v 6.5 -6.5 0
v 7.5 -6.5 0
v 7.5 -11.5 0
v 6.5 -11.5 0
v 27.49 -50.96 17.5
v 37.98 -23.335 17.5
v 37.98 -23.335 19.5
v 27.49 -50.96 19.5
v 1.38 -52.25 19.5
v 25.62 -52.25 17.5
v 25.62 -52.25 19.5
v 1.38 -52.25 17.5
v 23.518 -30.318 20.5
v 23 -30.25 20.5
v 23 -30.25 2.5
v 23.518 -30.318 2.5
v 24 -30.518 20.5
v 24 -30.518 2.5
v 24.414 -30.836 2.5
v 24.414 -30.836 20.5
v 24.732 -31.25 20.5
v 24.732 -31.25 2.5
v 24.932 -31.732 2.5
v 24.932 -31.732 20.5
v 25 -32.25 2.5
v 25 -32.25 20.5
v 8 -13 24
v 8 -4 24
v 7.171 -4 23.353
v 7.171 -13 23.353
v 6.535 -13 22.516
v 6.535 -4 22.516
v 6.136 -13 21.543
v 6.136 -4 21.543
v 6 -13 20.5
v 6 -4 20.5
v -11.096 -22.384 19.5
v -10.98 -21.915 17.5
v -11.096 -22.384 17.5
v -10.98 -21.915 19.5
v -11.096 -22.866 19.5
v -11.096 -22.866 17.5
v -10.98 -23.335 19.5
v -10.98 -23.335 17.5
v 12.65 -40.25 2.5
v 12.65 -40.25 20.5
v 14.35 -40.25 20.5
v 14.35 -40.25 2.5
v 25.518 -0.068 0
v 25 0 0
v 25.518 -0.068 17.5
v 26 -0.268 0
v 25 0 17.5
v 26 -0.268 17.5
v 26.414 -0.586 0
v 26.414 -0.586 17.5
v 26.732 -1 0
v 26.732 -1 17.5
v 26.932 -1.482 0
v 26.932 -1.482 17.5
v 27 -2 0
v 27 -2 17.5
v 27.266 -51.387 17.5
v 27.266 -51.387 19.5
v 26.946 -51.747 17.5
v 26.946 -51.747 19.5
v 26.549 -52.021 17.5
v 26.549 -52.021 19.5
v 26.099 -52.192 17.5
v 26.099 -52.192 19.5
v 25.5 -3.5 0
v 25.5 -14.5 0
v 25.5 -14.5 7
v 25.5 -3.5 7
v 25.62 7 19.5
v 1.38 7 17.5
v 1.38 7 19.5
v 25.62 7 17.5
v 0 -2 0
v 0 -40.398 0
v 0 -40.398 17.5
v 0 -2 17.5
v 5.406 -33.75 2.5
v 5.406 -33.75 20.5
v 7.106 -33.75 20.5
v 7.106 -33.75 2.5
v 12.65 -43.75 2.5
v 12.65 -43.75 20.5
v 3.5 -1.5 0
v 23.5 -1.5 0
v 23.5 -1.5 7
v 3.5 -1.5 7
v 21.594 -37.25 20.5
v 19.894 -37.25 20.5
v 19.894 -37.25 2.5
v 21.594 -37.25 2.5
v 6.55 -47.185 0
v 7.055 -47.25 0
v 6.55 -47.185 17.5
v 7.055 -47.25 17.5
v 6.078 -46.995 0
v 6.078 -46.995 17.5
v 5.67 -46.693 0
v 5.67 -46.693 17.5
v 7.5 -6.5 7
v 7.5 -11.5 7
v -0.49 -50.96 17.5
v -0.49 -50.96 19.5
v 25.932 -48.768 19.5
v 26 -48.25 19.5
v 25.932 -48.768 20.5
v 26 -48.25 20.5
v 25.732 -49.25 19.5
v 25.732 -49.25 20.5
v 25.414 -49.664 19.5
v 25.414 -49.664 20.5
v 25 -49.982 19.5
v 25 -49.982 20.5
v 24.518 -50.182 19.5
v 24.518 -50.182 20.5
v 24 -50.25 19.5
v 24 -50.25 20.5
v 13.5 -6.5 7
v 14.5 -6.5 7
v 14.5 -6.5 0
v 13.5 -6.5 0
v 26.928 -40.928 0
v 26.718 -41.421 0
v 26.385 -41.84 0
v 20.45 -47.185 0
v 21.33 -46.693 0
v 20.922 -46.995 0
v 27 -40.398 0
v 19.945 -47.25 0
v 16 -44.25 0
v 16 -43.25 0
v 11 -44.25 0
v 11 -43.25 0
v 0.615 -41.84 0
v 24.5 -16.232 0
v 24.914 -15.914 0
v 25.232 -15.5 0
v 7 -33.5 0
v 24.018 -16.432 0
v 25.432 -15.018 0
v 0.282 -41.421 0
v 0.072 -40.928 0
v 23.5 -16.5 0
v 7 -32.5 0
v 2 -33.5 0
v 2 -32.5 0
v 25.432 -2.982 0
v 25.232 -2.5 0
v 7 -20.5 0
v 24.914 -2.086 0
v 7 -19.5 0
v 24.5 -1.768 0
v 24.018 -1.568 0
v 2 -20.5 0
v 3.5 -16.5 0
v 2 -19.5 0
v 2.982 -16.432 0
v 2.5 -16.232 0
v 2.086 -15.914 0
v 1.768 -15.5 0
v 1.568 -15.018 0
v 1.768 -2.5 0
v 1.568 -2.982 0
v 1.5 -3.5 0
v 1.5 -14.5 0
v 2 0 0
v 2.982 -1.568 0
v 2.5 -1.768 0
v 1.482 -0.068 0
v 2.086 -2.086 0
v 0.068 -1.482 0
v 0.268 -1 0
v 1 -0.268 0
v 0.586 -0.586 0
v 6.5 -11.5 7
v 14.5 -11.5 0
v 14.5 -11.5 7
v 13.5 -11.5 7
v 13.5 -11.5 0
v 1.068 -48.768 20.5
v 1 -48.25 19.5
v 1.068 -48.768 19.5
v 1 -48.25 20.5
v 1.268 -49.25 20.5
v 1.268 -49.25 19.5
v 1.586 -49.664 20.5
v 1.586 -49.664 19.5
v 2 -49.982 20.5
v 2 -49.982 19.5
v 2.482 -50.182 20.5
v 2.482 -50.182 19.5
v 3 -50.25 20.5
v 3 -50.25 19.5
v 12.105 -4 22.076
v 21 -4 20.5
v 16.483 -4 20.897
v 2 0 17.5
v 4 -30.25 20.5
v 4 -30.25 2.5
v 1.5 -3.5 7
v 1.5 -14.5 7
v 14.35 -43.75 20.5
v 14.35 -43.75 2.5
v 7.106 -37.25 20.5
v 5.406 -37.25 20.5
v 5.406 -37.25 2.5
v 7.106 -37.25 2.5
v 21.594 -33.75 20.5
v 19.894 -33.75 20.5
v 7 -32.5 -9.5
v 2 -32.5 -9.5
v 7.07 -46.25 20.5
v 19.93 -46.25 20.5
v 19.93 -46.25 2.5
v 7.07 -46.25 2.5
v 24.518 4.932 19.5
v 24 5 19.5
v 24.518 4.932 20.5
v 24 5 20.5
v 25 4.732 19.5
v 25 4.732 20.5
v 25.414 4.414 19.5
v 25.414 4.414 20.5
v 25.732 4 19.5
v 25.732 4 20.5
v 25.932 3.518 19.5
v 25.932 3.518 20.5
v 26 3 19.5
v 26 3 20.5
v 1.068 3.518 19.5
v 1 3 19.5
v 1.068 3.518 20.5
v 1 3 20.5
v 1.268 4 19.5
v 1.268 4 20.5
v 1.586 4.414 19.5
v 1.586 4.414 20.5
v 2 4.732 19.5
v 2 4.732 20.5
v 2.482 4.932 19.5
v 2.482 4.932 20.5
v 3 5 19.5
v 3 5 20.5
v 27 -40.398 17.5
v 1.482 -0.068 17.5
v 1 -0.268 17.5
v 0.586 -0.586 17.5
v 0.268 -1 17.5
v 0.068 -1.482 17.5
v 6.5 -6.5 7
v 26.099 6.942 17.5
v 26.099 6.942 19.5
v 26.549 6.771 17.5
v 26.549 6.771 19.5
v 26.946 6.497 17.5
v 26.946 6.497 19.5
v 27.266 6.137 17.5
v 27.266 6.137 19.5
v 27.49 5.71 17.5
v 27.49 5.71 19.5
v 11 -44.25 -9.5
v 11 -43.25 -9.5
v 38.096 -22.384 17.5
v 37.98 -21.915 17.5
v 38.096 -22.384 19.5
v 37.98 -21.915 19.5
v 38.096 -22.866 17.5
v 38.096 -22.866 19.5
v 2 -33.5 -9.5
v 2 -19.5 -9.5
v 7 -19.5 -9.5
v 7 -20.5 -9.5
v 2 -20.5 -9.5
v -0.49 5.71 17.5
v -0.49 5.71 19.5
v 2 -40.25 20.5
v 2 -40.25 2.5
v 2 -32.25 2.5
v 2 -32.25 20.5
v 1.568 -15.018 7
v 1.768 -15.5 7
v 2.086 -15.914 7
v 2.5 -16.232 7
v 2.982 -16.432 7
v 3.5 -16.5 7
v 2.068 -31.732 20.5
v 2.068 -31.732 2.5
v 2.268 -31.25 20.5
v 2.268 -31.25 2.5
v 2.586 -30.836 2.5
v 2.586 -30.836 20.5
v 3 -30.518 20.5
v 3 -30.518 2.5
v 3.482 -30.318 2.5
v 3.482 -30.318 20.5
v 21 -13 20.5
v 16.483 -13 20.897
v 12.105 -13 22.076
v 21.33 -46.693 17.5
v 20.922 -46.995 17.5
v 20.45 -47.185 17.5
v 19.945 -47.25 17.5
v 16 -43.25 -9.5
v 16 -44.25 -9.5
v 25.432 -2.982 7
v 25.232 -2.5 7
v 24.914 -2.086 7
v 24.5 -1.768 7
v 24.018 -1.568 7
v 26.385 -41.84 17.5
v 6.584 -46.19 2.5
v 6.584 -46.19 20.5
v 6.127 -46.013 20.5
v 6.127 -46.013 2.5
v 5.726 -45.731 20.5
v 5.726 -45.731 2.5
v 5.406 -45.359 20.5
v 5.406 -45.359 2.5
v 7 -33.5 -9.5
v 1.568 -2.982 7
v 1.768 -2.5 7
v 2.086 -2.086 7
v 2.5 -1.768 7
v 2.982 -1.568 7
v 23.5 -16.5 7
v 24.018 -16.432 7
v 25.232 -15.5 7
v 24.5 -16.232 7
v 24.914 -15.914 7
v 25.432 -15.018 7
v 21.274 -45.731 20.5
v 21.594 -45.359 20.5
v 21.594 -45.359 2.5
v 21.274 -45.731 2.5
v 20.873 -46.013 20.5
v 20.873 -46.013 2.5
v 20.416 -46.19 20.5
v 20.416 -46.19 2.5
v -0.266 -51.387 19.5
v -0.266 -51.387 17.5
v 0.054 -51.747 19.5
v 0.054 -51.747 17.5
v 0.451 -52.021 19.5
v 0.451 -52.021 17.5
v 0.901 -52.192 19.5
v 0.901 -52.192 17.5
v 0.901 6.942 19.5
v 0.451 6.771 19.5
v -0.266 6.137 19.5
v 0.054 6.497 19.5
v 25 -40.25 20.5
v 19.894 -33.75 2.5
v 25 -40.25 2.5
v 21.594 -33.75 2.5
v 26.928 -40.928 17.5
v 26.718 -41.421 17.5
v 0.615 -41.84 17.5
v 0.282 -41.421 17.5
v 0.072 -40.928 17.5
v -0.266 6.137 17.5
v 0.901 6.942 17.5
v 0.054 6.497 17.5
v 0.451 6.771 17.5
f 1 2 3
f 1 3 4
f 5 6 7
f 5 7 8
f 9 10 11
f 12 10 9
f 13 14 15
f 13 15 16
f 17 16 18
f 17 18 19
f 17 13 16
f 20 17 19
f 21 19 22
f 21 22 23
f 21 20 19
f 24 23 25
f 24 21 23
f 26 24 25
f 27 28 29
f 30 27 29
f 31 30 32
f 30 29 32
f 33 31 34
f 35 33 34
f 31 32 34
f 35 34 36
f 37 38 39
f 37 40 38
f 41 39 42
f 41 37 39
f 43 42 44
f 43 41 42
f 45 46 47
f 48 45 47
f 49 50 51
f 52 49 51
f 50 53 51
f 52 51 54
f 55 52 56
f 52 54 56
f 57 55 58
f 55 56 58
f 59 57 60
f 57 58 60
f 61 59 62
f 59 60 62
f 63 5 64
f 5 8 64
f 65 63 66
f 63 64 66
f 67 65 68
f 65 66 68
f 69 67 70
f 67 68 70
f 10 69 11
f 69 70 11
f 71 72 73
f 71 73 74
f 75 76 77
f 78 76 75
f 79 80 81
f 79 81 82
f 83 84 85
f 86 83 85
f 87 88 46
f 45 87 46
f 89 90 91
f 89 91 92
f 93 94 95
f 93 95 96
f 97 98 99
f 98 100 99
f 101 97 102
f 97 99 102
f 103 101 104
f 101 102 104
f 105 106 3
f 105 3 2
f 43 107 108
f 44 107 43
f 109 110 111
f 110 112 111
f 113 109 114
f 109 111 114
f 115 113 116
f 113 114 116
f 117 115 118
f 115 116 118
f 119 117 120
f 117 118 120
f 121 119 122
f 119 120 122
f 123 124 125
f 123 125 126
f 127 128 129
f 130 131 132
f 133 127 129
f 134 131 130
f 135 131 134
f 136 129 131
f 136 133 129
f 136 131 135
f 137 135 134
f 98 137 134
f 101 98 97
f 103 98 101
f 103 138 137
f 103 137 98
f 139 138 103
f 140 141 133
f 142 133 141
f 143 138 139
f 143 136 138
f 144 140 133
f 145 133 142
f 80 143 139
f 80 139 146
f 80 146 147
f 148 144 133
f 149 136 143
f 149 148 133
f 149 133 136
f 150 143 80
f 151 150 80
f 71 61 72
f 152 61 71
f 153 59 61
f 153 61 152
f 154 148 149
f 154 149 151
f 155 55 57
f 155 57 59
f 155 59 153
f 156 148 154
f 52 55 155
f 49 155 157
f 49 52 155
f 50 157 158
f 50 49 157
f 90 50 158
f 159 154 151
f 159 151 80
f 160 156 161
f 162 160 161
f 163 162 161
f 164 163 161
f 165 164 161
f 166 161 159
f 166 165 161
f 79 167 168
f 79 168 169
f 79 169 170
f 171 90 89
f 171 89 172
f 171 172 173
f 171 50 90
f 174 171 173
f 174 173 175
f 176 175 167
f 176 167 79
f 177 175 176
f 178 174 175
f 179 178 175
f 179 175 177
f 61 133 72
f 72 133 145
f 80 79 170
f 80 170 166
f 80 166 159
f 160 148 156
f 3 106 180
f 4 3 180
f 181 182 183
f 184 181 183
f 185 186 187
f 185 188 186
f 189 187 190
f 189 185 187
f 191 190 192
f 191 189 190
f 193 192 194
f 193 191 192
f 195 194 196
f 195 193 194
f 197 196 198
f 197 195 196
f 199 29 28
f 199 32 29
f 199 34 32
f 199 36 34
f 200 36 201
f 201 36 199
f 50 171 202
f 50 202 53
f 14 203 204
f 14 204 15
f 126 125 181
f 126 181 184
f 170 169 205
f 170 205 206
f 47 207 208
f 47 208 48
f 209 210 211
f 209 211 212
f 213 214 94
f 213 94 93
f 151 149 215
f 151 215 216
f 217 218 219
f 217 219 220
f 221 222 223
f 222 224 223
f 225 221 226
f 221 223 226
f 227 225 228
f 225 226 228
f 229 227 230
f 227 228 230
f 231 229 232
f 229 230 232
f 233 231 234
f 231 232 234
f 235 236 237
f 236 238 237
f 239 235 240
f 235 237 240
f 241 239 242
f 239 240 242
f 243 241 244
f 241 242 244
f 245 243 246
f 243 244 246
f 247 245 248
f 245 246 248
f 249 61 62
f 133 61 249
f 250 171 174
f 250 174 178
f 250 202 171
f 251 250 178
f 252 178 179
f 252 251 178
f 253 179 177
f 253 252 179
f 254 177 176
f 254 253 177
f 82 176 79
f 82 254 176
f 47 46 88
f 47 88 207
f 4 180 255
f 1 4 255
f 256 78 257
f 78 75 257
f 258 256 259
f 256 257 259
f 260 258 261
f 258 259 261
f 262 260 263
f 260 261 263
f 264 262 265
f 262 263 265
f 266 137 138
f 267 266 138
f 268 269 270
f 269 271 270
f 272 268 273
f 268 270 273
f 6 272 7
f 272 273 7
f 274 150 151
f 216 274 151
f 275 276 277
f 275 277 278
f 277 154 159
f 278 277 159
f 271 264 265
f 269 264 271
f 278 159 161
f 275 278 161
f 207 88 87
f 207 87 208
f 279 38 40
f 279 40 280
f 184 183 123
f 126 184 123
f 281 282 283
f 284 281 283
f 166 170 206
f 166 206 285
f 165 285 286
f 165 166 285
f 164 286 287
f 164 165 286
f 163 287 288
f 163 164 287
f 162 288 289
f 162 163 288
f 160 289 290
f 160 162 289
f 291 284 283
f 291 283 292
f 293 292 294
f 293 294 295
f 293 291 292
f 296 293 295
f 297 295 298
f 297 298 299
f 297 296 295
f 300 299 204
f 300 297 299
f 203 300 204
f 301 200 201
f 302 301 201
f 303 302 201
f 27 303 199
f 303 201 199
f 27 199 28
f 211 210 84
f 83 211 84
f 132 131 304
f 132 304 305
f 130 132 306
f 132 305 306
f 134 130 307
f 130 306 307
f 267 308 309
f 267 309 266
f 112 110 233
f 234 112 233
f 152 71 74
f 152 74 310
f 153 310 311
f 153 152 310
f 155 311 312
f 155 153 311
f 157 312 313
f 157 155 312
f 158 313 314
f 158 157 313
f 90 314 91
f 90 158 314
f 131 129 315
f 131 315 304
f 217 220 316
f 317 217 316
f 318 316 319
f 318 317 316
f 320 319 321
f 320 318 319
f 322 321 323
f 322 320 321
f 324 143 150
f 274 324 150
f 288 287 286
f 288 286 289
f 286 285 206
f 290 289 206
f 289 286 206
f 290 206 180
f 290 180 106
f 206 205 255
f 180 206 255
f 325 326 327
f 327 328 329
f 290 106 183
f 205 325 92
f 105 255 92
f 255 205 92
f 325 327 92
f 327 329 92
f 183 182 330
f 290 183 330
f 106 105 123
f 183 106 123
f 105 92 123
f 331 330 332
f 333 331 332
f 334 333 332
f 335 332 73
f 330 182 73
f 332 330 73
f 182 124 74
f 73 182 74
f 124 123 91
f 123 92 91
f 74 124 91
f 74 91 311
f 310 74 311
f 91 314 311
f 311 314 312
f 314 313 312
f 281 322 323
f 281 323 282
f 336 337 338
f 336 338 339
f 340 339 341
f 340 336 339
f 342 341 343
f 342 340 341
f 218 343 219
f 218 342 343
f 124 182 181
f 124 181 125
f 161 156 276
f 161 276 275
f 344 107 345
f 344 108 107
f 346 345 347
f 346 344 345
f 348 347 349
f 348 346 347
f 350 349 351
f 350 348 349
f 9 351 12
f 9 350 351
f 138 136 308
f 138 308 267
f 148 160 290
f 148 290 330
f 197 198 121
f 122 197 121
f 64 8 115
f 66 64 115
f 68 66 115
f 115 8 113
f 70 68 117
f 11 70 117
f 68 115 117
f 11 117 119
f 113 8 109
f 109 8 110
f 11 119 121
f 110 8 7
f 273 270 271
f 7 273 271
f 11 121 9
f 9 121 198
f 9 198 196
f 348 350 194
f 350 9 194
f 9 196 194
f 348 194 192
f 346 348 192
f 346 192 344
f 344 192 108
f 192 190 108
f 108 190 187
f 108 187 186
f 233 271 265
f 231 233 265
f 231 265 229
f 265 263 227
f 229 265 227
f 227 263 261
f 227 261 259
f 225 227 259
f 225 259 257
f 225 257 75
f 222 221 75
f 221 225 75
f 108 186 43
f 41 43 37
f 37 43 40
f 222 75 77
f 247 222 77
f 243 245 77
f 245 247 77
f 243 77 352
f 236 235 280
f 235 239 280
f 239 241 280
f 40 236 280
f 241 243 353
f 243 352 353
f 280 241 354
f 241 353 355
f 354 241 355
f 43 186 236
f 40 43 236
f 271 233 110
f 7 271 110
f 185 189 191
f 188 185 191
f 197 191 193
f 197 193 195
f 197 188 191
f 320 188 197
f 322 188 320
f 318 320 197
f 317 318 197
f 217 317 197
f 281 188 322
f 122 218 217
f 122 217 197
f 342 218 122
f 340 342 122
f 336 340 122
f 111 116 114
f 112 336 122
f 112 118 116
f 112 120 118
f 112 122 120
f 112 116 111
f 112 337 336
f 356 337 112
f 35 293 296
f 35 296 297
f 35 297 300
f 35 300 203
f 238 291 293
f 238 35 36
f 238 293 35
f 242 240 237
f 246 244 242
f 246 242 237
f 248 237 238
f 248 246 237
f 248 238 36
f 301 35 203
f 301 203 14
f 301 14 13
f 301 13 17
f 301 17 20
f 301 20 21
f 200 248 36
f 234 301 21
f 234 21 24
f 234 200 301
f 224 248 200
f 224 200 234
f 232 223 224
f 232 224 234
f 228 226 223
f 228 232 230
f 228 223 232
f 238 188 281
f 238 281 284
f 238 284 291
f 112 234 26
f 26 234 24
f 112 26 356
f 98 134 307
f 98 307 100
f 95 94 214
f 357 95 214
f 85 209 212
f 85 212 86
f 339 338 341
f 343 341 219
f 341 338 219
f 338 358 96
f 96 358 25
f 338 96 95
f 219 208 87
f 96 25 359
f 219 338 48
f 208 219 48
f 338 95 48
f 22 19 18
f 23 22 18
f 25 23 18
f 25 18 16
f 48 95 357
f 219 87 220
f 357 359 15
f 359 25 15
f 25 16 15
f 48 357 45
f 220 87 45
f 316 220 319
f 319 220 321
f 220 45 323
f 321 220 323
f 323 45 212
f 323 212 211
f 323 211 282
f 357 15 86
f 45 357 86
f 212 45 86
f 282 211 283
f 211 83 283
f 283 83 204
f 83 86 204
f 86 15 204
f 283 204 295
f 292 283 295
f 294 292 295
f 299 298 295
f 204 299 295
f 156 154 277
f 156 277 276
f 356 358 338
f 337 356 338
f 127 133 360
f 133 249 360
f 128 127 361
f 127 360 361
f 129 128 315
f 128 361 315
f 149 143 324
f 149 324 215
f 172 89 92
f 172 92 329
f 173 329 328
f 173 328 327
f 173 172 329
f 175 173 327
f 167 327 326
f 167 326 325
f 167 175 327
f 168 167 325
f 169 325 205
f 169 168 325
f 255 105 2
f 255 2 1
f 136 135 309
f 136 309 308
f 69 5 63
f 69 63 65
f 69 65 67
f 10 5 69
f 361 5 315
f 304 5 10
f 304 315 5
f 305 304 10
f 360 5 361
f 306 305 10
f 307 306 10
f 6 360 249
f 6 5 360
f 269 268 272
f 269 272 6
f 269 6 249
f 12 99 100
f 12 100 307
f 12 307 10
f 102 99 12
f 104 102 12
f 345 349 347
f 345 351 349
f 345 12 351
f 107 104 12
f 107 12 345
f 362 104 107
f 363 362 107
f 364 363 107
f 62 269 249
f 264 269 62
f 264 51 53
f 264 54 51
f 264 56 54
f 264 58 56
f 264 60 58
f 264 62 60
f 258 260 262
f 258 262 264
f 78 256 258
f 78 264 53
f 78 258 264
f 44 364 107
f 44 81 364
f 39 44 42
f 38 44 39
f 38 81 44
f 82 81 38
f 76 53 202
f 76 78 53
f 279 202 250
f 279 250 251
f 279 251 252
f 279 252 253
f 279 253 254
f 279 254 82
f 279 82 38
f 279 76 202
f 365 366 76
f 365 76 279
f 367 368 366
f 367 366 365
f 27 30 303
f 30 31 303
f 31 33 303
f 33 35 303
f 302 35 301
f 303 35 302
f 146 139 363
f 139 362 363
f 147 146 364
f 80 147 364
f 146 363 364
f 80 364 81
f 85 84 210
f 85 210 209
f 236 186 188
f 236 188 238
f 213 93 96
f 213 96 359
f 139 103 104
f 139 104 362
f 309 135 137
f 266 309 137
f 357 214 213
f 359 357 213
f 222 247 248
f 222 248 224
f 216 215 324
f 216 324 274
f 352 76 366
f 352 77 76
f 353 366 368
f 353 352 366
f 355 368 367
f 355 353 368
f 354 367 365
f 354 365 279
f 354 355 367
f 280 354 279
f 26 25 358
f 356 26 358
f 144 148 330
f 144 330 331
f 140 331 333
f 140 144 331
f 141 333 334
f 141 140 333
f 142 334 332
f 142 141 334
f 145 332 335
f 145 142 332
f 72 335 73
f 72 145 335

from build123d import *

# Parameters (mm, degrees)
EXTRUDE_1_DEPTH     = 17.5
EXTRUDE_2_DEPTH     = 2
SKETCH_3_W          = 25
SKETCH_3_H          = 55.25
EXTRUDE_3_DEPTH     = 1
FILLET_1_R          = 2
FILLET_2_R          = 2
FILLET_3_R          = 2
SKETCH_4_W          = 15
SKETCH_4_H          = 9
EXTRUDE_4_DEPTH     = 3.5
CUT_EXTRUDE_1_DEPTH = 9
SKETCH_6_W          = 1.7
SKETCH_6_H          = 3.5
CUT_EXTRUDE_2_DEPTH = 18
FILLET_4_R          = 2
CUT_EXTRUDE_3_DEPTH = 7
SKETCH_8_W          = 5
SKETCH_8_H          = 1
EXTRUDE_5_DEPTH     = 9.5
SKETCH_9_W          = 1
SKETCH_9_H          = 5
EXTRUDE_6_DEPTH     = 7


with BuildPart() as part:
    # Эскиз1 → Бобышка-Вытянуть1 (new body)
    with BuildSketch(Plane.XY):
        Polygon((0, 0), (27, 0), (27, -41.25), (20.75, -47.25), (6.25, -47.25), (0, -41.25), align=None)
    extrude(amount=EXTRUDE_1_DEPTH)

    # Эскиз2 → Бобышка-Вытянуть2 (add)
    with BuildSketch(Plane.XY.offset(17.5)):
        Polygon((0, 7), (27, 7), (38.25, -22.625), (27, -52.25), (0, -52.25), (-11.25, -22.625), align=None)
    extrude(amount=EXTRUDE_2_DEPTH)

    # Эскиз3 → Бобышка-Вытянуть3 (add)
    with BuildSketch(Plane.XY.offset(19.5)):
        with Locations((13.5, -22.625)):
            Rectangle(SKETCH_3_W, SKETCH_3_H)
    extrude(amount=EXTRUDE_3_DEPTH)

    # Скругление1
    fillet_1_edges = [part.edges().sort_by_distance(p)[0] for p in [
        (0, 7, 18.5),
        (27, -52.25, 18.5),
        (38.25, -22.625, 18.5),
        (27, 7, 18.5),
    ]]
    fillet(fillet_1_edges, radius=FILLET_1_R)

    # Скругление2
    fillet_2_edges = [part.edges().sort_by_distance(p)[0] for p in [
        (-11.25, -22.625, 18.5),
        (0, -52.25, 18.5),
    ]]
    fillet(fillet_2_edges, radius=FILLET_2_R)

    # Скругление3
    fillet_3_edges = [part.edges().sort_by_distance(p)[0] for p in [
        (1, 5, 20),
        (1, -50.25, 20),
        (26, -50.25, 20),
        (26, 5, 20),
    ]]
    fillet(fillet_3_edges, radius=FILLET_3_R)

    # Эскиз4 → Бобышка-Вытянуть4 (add)
    with BuildSketch(Plane.XY.offset(20.5)):
        with Locations((13.5, -8.5)):
            Rectangle(SKETCH_4_W, SKETCH_4_H)
    extrude(amount=EXTRUDE_4_DEPTH)

    # Эскиз5 → Вырез-Вытянуть1 (cut)
    with BuildSketch(Plane(origin=(0, -4, 0), x_dir=(1, 0, 0), z_dir=(0, 1, 0))):
        with BuildLine():
            ThreePointArc((21, -20.5), (14.268543991, -21.390306253), (8, -24))
            Line((8, -24), (21, -24))
            Line((21, -24), (21, -20.5))
        make_face()
        with BuildLine():
            Line((6, -20.5), (6, -24))
            Line((6, -24), (8, -24))
            ThreePointArc((8, -24), (6.535262235, -22.515564437), (6, -20.5))
        make_face()
    extrude(amount=-CUT_EXTRUDE_1_DEPTH, mode=Mode.SUBTRACT)

    # Эскиз6 → Вырез-Вытянуть2 (cut)
    with BuildSketch(Plane.XY.offset(20.5)):
        with BuildLine():
            Line((4, -30.25), (23, -30.25))
            ThreePointArc((23, -30.25), (24.414213562, -30.835786438), (25, -32.25))
            Line((25, -32.25), (25, -40.25))
            Line((25, -40.25), (21.593733072, -45.359400392))
            ThreePointArc((21.593733072, -45.359400392), (20.873348334, -46.013349198), (19.929632483, -46.25))
            Line((19.929632483, -46.25), (7.070367517, -46.25))
            ThreePointArc((7.070367517, -46.25), (6.126651666, -46.013349198), (5.406266928, -45.359400392))
            Line((5.406266928, -45.359400392), (2, -40.25))
            Line((2, -40.25), (2, -32.25))
            ThreePointArc((2, -32.25), (2.585786438, -30.835786438), (4, -30.25))
        make_face()
        with Locations((6.256266928, -35.5)):
            Rectangle(SKETCH_6_W, SKETCH_6_H, mode=Mode.SUBTRACT)
        with Locations((20.743733072, -35.5)):
            Rectangle(SKETCH_6_W, SKETCH_6_H, mode=Mode.SUBTRACT)
        with Locations((13.5, -42)):
            Rectangle(SKETCH_6_W, SKETCH_6_H, mode=Mode.SUBTRACT)
    extrude(amount=-CUT_EXTRUDE_2_DEPTH, mode=Mode.SUBTRACT)

    # Скругление4
    fillet_4_edges = [part.edges().sort_by_distance(p)[0] for p in [
        (0, 0, 8.75),
        (27, 0, 8.75),
        (27, -41.25, 8.75),
        (20.75, -47.25, 8.75),
        (6.25, -47.25, 8.75),
        (0, -41.25, 8.75),
    ]]
    fillet(fillet_4_edges, radius=FILLET_4_R)

    # Эскиз7 → Вырез-Вытянуть3 (cut)
    with BuildSketch(Plane(origin=(0, 0, 0), x_dir=(-1, 0, 0), z_dir=(0, 0, -1))):
        with BuildLine():
            Line((-23.5, -1.5), (-3.5, -1.5))
            ThreePointArc((-3.5, -1.5), (-2.085786438, -2.085786438), (-1.5, -3.5))
            Line((-1.5, -3.5), (-1.5, -14.5))
            ThreePointArc((-1.5, -14.5), (-2.085786438, -15.914213562), (-3.5, -16.5))
            Line((-3.5, -16.5), (-23.5, -16.5))
            ThreePointArc((-23.5, -16.5), (-24.914213562, -15.914213562), (-25.5, -14.5))
            Line((-25.5, -14.5), (-25.5, -3.5))
            ThreePointArc((-25.5, -3.5), (-24.914213562, -2.085786438), (-23.5, -1.5))
        make_face()
    extrude(amount=-CUT_EXTRUDE_3_DEPTH, mode=Mode.SUBTRACT)

    # Эскиз8 → Бобышка-Вытянуть5 (add)
    with BuildSketch(Plane(origin=(0, 0, 0), x_dir=(-1, 0, 0), z_dir=(0, 0, -1))):
        with Locations((-4.5, -20)):
            Rectangle(SKETCH_8_W, SKETCH_8_H)
        with Locations((-4.5, -33)):
            Rectangle(SKETCH_8_W, SKETCH_8_H)
        with Locations((-13.5, -43.75)):
            Rectangle(SKETCH_8_W, SKETCH_8_H)
    extrude(amount=EXTRUDE_5_DEPTH)

    # Эскиз9 → Бобышка-Вытянуть6 (add)
    with BuildSketch(Plane(origin=(0, 0, 7), x_dir=(-1, 0, 0), z_dir=(0, 0, -1))):
        with Locations((-7, -9)):
            Rectangle(SKETCH_9_W, SKETCH_9_H)
        with Locations((-14, -9)):
            Rectangle(SKETCH_9_W, SKETCH_9_H)
    extrude(amount=EXTRUDE_6_DEPTH)


solid = part.part
